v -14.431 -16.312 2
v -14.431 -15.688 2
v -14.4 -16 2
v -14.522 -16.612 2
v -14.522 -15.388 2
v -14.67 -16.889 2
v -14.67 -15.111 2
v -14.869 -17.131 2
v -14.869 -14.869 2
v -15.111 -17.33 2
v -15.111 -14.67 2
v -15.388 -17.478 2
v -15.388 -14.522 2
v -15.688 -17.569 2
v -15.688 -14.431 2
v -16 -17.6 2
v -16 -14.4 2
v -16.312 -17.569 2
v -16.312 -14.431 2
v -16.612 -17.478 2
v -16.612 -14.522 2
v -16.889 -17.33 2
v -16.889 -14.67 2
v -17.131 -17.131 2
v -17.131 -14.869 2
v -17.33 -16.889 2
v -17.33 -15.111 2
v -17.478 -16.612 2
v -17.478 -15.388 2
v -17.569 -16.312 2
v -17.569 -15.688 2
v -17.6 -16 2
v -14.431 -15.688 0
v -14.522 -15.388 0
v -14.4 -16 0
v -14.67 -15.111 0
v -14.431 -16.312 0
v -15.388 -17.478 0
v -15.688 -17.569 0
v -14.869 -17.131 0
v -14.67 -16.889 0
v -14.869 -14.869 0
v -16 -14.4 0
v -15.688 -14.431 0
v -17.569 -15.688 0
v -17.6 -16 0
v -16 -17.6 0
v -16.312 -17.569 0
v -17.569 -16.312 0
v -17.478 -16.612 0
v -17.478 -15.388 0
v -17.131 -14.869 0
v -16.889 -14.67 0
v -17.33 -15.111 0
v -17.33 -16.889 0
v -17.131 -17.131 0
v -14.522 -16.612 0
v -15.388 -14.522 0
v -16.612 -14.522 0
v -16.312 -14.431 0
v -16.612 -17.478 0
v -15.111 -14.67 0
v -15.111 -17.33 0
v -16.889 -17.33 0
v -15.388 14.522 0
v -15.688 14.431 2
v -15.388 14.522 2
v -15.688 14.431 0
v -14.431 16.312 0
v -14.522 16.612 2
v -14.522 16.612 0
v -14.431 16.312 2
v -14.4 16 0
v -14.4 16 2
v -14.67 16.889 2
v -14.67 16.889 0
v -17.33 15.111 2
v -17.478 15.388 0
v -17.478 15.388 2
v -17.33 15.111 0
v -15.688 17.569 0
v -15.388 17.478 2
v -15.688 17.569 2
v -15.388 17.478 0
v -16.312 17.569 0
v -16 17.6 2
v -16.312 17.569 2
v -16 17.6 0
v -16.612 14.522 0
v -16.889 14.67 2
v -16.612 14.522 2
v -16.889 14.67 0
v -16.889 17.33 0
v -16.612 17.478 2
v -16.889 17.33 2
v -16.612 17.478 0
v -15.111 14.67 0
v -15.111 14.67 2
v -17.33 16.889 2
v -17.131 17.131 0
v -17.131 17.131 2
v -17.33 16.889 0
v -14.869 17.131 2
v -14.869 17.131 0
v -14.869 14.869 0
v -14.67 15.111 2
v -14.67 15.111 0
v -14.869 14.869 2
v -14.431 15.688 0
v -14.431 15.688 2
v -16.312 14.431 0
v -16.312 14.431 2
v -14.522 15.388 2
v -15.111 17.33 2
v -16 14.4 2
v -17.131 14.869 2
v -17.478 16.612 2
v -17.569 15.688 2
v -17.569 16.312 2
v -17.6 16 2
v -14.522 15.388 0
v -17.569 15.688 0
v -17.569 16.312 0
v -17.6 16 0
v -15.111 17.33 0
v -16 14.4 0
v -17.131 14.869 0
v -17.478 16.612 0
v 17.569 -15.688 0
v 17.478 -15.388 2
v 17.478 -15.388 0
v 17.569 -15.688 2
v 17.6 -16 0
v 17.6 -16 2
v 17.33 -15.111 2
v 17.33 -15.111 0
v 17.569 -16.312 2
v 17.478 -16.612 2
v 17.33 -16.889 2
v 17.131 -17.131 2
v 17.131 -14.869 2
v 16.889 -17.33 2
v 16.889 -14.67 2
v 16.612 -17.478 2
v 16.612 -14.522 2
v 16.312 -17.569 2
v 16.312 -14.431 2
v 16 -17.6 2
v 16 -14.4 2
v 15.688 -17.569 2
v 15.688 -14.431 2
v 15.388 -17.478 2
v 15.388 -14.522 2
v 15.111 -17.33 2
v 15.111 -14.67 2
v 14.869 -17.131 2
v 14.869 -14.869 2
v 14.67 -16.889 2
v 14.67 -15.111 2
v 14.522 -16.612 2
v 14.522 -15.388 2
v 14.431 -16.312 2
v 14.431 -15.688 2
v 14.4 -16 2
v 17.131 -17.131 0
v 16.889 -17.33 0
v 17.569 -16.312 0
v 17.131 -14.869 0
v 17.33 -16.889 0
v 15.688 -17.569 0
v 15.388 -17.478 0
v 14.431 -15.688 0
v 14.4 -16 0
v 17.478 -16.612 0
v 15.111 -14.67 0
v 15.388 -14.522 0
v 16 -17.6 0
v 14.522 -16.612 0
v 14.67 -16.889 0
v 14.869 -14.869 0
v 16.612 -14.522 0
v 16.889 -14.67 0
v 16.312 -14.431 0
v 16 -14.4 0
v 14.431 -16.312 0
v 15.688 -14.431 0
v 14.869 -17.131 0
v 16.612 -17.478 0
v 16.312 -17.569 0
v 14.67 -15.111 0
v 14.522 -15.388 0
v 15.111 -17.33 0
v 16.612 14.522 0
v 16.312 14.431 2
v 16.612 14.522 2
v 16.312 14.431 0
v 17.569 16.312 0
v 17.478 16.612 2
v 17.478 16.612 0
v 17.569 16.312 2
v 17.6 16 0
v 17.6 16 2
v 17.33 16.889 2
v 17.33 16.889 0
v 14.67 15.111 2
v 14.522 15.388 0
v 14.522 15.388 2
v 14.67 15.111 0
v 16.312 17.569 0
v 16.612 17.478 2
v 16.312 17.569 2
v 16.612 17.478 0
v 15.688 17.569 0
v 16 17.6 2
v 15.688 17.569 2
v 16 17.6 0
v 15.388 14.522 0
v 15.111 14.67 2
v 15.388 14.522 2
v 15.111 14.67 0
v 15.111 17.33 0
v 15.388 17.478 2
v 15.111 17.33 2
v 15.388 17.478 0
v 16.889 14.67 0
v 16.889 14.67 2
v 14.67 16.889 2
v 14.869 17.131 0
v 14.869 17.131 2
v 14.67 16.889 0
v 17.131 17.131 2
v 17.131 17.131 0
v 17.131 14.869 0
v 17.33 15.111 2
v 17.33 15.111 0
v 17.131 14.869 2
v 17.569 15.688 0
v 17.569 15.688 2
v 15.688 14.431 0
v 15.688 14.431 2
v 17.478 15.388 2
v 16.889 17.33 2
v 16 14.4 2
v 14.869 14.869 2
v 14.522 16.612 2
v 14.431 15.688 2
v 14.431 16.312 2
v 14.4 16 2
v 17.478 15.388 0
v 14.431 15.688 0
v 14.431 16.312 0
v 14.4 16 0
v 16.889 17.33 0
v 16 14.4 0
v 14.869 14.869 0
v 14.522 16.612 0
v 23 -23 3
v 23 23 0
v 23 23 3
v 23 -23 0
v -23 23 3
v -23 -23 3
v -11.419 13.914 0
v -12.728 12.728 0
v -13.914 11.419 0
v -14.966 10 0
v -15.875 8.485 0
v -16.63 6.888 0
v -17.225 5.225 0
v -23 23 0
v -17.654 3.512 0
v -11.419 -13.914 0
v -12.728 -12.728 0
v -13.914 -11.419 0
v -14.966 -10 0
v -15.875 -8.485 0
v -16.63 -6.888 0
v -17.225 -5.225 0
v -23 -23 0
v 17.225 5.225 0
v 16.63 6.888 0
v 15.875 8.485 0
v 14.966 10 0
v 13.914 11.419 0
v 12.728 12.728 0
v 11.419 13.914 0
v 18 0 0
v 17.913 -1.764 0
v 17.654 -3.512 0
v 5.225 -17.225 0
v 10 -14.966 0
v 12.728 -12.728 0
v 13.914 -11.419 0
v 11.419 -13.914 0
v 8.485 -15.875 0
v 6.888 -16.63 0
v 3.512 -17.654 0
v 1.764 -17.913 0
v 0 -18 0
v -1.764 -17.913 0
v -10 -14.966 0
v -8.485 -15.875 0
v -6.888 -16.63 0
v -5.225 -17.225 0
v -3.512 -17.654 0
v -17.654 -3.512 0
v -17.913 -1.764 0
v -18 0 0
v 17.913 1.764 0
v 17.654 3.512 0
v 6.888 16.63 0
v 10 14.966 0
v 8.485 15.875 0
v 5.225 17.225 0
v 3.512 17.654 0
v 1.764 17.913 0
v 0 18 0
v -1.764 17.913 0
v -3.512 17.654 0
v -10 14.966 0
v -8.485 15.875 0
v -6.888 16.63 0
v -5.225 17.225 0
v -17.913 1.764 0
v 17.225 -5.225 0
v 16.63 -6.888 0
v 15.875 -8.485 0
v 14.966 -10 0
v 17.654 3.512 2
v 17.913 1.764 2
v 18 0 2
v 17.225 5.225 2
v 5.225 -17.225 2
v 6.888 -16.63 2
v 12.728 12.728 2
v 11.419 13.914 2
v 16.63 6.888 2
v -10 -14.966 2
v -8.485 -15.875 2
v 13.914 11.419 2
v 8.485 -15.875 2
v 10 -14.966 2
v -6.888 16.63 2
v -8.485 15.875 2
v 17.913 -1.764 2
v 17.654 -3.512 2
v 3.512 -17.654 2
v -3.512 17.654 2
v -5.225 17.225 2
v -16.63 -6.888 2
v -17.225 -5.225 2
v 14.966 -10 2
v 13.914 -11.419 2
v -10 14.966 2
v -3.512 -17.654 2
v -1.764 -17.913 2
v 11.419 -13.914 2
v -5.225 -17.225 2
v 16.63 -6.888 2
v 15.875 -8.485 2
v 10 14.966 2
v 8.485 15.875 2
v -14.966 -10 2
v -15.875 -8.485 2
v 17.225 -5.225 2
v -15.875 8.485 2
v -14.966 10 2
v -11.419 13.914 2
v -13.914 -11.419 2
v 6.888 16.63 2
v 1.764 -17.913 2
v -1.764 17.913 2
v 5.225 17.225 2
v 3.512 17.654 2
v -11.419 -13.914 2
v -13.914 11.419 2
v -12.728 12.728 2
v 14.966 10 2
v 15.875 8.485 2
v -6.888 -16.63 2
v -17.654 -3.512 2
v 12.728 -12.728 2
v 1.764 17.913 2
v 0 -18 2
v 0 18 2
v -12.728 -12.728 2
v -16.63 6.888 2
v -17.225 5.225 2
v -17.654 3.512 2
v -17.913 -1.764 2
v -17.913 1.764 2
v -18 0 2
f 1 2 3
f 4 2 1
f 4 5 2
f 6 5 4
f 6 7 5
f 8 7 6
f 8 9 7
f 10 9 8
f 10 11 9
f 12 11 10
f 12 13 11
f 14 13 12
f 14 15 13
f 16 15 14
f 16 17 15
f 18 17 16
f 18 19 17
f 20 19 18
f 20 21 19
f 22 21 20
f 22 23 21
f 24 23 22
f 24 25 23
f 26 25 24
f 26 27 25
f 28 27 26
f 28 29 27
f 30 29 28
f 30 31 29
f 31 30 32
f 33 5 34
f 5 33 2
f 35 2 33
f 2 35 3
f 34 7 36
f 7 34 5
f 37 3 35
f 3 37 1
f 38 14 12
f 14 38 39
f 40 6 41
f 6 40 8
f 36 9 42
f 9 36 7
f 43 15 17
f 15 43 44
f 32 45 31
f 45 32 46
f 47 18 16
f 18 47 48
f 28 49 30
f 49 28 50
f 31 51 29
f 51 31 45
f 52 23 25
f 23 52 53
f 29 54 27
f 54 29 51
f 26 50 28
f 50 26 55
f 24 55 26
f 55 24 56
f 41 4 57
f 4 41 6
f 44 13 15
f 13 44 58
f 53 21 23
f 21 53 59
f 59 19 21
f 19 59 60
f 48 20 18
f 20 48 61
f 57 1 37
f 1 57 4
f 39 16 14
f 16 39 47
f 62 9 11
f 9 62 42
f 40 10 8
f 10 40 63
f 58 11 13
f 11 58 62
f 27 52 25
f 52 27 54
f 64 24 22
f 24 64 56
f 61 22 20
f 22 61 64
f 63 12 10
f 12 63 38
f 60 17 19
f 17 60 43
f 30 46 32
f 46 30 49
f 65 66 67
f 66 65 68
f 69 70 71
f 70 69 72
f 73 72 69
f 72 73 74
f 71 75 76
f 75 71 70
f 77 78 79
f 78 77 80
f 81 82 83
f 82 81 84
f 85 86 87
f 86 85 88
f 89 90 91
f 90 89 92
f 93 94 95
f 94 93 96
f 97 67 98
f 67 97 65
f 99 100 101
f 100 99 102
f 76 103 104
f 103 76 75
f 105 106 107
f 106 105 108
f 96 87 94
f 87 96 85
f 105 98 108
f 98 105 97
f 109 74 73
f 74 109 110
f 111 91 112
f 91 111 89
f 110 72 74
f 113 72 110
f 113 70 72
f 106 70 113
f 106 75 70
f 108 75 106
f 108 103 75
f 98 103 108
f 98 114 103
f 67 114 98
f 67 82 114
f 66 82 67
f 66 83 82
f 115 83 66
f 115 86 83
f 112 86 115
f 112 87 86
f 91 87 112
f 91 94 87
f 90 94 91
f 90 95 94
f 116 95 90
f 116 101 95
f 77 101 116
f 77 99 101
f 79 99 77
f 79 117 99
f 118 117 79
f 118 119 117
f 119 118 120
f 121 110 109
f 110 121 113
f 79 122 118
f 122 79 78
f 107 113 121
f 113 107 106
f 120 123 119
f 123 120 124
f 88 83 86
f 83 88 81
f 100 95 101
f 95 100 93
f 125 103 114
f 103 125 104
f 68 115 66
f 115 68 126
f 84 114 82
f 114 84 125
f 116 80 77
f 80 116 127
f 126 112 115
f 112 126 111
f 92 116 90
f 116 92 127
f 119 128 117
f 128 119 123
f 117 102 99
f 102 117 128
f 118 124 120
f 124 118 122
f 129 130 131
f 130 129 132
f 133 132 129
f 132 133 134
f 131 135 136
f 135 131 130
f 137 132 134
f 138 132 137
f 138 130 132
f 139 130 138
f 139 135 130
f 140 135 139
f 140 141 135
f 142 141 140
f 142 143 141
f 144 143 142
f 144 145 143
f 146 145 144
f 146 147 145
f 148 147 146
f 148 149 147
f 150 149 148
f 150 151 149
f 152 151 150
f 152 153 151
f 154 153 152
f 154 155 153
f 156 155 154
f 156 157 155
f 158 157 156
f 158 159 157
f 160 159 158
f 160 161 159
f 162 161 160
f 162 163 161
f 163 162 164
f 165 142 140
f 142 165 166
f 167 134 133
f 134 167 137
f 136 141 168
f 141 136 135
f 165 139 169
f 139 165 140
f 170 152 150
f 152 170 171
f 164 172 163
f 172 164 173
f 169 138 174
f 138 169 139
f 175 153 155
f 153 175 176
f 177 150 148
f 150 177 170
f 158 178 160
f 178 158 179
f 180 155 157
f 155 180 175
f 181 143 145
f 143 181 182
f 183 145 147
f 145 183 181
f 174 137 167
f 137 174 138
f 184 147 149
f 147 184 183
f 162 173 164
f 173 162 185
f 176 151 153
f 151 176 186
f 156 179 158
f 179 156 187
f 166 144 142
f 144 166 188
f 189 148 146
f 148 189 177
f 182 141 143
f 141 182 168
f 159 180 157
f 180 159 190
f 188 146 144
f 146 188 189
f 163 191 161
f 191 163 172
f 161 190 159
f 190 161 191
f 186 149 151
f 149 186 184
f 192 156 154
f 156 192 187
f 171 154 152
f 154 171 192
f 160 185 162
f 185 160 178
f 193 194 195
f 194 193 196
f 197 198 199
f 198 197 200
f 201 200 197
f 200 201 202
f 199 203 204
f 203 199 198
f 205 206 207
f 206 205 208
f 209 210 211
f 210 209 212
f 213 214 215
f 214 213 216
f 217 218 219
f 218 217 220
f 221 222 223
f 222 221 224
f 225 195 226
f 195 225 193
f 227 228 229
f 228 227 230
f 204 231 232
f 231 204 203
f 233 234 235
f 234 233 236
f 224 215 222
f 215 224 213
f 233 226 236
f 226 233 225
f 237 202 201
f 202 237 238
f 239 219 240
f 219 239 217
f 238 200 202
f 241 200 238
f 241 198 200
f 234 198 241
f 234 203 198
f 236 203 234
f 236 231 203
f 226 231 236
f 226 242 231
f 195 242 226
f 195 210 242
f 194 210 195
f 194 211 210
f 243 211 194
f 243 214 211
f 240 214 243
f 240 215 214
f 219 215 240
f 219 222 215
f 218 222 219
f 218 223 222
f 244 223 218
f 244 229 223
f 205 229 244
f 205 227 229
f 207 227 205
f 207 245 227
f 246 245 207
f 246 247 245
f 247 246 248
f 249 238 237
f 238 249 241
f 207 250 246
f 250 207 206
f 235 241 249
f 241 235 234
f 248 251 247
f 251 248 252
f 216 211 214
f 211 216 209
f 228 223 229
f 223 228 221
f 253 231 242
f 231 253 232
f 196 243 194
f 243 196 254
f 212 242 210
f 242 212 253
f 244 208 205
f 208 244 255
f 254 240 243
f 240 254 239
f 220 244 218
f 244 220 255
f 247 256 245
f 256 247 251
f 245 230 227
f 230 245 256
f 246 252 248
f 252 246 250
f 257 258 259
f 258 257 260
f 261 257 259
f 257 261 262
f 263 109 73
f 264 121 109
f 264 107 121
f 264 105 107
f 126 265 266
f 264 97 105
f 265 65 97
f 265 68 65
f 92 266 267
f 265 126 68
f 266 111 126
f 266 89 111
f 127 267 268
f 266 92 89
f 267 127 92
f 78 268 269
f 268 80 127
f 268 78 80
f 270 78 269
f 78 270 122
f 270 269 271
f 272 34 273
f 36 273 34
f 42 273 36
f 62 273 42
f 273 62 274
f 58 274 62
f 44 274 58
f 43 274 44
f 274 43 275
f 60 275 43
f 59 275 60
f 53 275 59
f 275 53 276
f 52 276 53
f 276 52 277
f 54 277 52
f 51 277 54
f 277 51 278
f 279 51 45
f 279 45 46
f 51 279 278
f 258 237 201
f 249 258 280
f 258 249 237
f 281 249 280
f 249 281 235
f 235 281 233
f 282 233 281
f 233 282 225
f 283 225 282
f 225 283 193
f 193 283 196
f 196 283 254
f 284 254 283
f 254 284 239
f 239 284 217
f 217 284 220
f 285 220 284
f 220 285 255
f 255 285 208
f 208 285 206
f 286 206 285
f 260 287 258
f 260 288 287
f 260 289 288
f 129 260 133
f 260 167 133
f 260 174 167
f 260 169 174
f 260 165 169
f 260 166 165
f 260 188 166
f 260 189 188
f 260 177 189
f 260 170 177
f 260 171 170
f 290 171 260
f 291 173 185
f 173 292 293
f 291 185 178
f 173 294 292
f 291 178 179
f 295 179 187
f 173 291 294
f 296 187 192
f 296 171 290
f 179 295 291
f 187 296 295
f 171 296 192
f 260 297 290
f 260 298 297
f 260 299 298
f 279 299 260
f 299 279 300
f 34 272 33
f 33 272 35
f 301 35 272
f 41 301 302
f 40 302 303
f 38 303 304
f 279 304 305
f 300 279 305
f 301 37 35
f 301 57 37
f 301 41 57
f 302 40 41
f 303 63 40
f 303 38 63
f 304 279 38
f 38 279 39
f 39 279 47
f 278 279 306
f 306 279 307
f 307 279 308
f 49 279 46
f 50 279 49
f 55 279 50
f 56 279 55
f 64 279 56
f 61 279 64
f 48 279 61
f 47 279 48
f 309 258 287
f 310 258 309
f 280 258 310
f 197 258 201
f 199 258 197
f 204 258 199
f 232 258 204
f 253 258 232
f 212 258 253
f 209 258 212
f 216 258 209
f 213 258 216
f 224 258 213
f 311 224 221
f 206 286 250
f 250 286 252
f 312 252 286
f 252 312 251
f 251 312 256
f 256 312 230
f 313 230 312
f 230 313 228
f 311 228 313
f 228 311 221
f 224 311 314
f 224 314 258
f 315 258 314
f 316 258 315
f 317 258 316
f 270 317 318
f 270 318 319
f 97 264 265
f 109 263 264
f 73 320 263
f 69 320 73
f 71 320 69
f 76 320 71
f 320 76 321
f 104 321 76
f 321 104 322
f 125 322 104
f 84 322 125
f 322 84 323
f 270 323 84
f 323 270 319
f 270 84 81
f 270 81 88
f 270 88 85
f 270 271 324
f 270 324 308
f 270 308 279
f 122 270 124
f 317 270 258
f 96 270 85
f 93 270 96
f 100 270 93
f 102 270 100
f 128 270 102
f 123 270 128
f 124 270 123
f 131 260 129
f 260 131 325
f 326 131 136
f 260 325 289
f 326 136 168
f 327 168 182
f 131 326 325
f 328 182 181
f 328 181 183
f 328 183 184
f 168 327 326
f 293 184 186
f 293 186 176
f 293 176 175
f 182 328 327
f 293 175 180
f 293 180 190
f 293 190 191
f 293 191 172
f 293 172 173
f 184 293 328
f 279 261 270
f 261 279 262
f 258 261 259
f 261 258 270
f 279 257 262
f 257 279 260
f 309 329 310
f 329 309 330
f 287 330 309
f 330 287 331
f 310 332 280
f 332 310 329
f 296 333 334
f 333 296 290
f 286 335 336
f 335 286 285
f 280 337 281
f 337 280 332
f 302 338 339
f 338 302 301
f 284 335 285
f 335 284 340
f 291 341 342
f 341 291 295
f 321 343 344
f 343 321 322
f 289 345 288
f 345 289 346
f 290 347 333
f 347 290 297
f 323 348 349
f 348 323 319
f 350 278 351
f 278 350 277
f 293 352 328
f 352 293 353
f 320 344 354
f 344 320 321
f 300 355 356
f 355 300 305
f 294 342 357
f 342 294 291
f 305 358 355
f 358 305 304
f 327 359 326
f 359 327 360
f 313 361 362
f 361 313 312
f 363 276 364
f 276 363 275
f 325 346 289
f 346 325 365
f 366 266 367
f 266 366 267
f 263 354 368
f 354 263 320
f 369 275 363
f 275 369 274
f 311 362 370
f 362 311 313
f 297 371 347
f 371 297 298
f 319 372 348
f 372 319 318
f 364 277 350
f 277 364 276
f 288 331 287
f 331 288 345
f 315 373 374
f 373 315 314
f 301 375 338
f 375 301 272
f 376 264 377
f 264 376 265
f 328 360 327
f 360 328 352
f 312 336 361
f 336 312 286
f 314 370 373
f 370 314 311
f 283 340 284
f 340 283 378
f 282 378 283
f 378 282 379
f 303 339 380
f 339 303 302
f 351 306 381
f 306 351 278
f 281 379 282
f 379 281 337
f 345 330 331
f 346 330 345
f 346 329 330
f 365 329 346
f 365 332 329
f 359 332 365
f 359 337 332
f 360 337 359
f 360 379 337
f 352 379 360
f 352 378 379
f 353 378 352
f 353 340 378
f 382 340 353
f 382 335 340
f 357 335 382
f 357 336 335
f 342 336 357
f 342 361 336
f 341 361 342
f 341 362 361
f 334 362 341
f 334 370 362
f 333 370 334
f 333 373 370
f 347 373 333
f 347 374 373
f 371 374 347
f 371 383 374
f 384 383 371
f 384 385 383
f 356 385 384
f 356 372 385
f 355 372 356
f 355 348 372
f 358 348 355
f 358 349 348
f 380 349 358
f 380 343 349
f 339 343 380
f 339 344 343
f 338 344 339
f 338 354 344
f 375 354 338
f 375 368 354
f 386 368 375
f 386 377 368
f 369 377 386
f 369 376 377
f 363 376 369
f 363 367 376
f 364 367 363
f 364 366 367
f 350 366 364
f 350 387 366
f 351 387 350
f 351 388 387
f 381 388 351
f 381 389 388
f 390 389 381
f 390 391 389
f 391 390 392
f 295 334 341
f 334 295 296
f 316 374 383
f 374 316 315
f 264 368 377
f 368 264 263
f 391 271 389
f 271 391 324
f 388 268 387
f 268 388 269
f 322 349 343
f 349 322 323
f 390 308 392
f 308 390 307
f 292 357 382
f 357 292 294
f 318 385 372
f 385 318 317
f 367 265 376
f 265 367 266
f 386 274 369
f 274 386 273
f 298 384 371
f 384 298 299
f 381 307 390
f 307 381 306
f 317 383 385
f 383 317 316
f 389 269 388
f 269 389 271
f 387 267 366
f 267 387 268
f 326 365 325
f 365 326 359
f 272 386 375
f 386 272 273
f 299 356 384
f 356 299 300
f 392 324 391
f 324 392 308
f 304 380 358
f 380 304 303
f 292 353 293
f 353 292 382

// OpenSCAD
// 40mm Fan Mount Plate
fan_size = 40;
hole_spacing = 32;  // Standard 40mm fan hole spacing
plate_thickness = 3;
mount_hole_d = 3.2;  // M3 clearance

difference() {
    // Base plate
    translate([0, 0, plate_thickness/2])
        cube([fan_size + 6, fan_size + 6, plate_thickness], center=true);

    // Center airflow hole
    cylinder(d=fan_size - 4, h=plate_thickness + 1, center=true, $fn=64);

    // Mounting holes (4 corners)
    for (x = [-1, 1]) {
        for (y = [-1, 1]) {
            translate([x * hole_spacing/2, y * hole_spacing/2, 0])
                cylinder(d=mount_hole_d, h=plate_thickness + 1, center=true, $fn=32);
        }
    }
}
